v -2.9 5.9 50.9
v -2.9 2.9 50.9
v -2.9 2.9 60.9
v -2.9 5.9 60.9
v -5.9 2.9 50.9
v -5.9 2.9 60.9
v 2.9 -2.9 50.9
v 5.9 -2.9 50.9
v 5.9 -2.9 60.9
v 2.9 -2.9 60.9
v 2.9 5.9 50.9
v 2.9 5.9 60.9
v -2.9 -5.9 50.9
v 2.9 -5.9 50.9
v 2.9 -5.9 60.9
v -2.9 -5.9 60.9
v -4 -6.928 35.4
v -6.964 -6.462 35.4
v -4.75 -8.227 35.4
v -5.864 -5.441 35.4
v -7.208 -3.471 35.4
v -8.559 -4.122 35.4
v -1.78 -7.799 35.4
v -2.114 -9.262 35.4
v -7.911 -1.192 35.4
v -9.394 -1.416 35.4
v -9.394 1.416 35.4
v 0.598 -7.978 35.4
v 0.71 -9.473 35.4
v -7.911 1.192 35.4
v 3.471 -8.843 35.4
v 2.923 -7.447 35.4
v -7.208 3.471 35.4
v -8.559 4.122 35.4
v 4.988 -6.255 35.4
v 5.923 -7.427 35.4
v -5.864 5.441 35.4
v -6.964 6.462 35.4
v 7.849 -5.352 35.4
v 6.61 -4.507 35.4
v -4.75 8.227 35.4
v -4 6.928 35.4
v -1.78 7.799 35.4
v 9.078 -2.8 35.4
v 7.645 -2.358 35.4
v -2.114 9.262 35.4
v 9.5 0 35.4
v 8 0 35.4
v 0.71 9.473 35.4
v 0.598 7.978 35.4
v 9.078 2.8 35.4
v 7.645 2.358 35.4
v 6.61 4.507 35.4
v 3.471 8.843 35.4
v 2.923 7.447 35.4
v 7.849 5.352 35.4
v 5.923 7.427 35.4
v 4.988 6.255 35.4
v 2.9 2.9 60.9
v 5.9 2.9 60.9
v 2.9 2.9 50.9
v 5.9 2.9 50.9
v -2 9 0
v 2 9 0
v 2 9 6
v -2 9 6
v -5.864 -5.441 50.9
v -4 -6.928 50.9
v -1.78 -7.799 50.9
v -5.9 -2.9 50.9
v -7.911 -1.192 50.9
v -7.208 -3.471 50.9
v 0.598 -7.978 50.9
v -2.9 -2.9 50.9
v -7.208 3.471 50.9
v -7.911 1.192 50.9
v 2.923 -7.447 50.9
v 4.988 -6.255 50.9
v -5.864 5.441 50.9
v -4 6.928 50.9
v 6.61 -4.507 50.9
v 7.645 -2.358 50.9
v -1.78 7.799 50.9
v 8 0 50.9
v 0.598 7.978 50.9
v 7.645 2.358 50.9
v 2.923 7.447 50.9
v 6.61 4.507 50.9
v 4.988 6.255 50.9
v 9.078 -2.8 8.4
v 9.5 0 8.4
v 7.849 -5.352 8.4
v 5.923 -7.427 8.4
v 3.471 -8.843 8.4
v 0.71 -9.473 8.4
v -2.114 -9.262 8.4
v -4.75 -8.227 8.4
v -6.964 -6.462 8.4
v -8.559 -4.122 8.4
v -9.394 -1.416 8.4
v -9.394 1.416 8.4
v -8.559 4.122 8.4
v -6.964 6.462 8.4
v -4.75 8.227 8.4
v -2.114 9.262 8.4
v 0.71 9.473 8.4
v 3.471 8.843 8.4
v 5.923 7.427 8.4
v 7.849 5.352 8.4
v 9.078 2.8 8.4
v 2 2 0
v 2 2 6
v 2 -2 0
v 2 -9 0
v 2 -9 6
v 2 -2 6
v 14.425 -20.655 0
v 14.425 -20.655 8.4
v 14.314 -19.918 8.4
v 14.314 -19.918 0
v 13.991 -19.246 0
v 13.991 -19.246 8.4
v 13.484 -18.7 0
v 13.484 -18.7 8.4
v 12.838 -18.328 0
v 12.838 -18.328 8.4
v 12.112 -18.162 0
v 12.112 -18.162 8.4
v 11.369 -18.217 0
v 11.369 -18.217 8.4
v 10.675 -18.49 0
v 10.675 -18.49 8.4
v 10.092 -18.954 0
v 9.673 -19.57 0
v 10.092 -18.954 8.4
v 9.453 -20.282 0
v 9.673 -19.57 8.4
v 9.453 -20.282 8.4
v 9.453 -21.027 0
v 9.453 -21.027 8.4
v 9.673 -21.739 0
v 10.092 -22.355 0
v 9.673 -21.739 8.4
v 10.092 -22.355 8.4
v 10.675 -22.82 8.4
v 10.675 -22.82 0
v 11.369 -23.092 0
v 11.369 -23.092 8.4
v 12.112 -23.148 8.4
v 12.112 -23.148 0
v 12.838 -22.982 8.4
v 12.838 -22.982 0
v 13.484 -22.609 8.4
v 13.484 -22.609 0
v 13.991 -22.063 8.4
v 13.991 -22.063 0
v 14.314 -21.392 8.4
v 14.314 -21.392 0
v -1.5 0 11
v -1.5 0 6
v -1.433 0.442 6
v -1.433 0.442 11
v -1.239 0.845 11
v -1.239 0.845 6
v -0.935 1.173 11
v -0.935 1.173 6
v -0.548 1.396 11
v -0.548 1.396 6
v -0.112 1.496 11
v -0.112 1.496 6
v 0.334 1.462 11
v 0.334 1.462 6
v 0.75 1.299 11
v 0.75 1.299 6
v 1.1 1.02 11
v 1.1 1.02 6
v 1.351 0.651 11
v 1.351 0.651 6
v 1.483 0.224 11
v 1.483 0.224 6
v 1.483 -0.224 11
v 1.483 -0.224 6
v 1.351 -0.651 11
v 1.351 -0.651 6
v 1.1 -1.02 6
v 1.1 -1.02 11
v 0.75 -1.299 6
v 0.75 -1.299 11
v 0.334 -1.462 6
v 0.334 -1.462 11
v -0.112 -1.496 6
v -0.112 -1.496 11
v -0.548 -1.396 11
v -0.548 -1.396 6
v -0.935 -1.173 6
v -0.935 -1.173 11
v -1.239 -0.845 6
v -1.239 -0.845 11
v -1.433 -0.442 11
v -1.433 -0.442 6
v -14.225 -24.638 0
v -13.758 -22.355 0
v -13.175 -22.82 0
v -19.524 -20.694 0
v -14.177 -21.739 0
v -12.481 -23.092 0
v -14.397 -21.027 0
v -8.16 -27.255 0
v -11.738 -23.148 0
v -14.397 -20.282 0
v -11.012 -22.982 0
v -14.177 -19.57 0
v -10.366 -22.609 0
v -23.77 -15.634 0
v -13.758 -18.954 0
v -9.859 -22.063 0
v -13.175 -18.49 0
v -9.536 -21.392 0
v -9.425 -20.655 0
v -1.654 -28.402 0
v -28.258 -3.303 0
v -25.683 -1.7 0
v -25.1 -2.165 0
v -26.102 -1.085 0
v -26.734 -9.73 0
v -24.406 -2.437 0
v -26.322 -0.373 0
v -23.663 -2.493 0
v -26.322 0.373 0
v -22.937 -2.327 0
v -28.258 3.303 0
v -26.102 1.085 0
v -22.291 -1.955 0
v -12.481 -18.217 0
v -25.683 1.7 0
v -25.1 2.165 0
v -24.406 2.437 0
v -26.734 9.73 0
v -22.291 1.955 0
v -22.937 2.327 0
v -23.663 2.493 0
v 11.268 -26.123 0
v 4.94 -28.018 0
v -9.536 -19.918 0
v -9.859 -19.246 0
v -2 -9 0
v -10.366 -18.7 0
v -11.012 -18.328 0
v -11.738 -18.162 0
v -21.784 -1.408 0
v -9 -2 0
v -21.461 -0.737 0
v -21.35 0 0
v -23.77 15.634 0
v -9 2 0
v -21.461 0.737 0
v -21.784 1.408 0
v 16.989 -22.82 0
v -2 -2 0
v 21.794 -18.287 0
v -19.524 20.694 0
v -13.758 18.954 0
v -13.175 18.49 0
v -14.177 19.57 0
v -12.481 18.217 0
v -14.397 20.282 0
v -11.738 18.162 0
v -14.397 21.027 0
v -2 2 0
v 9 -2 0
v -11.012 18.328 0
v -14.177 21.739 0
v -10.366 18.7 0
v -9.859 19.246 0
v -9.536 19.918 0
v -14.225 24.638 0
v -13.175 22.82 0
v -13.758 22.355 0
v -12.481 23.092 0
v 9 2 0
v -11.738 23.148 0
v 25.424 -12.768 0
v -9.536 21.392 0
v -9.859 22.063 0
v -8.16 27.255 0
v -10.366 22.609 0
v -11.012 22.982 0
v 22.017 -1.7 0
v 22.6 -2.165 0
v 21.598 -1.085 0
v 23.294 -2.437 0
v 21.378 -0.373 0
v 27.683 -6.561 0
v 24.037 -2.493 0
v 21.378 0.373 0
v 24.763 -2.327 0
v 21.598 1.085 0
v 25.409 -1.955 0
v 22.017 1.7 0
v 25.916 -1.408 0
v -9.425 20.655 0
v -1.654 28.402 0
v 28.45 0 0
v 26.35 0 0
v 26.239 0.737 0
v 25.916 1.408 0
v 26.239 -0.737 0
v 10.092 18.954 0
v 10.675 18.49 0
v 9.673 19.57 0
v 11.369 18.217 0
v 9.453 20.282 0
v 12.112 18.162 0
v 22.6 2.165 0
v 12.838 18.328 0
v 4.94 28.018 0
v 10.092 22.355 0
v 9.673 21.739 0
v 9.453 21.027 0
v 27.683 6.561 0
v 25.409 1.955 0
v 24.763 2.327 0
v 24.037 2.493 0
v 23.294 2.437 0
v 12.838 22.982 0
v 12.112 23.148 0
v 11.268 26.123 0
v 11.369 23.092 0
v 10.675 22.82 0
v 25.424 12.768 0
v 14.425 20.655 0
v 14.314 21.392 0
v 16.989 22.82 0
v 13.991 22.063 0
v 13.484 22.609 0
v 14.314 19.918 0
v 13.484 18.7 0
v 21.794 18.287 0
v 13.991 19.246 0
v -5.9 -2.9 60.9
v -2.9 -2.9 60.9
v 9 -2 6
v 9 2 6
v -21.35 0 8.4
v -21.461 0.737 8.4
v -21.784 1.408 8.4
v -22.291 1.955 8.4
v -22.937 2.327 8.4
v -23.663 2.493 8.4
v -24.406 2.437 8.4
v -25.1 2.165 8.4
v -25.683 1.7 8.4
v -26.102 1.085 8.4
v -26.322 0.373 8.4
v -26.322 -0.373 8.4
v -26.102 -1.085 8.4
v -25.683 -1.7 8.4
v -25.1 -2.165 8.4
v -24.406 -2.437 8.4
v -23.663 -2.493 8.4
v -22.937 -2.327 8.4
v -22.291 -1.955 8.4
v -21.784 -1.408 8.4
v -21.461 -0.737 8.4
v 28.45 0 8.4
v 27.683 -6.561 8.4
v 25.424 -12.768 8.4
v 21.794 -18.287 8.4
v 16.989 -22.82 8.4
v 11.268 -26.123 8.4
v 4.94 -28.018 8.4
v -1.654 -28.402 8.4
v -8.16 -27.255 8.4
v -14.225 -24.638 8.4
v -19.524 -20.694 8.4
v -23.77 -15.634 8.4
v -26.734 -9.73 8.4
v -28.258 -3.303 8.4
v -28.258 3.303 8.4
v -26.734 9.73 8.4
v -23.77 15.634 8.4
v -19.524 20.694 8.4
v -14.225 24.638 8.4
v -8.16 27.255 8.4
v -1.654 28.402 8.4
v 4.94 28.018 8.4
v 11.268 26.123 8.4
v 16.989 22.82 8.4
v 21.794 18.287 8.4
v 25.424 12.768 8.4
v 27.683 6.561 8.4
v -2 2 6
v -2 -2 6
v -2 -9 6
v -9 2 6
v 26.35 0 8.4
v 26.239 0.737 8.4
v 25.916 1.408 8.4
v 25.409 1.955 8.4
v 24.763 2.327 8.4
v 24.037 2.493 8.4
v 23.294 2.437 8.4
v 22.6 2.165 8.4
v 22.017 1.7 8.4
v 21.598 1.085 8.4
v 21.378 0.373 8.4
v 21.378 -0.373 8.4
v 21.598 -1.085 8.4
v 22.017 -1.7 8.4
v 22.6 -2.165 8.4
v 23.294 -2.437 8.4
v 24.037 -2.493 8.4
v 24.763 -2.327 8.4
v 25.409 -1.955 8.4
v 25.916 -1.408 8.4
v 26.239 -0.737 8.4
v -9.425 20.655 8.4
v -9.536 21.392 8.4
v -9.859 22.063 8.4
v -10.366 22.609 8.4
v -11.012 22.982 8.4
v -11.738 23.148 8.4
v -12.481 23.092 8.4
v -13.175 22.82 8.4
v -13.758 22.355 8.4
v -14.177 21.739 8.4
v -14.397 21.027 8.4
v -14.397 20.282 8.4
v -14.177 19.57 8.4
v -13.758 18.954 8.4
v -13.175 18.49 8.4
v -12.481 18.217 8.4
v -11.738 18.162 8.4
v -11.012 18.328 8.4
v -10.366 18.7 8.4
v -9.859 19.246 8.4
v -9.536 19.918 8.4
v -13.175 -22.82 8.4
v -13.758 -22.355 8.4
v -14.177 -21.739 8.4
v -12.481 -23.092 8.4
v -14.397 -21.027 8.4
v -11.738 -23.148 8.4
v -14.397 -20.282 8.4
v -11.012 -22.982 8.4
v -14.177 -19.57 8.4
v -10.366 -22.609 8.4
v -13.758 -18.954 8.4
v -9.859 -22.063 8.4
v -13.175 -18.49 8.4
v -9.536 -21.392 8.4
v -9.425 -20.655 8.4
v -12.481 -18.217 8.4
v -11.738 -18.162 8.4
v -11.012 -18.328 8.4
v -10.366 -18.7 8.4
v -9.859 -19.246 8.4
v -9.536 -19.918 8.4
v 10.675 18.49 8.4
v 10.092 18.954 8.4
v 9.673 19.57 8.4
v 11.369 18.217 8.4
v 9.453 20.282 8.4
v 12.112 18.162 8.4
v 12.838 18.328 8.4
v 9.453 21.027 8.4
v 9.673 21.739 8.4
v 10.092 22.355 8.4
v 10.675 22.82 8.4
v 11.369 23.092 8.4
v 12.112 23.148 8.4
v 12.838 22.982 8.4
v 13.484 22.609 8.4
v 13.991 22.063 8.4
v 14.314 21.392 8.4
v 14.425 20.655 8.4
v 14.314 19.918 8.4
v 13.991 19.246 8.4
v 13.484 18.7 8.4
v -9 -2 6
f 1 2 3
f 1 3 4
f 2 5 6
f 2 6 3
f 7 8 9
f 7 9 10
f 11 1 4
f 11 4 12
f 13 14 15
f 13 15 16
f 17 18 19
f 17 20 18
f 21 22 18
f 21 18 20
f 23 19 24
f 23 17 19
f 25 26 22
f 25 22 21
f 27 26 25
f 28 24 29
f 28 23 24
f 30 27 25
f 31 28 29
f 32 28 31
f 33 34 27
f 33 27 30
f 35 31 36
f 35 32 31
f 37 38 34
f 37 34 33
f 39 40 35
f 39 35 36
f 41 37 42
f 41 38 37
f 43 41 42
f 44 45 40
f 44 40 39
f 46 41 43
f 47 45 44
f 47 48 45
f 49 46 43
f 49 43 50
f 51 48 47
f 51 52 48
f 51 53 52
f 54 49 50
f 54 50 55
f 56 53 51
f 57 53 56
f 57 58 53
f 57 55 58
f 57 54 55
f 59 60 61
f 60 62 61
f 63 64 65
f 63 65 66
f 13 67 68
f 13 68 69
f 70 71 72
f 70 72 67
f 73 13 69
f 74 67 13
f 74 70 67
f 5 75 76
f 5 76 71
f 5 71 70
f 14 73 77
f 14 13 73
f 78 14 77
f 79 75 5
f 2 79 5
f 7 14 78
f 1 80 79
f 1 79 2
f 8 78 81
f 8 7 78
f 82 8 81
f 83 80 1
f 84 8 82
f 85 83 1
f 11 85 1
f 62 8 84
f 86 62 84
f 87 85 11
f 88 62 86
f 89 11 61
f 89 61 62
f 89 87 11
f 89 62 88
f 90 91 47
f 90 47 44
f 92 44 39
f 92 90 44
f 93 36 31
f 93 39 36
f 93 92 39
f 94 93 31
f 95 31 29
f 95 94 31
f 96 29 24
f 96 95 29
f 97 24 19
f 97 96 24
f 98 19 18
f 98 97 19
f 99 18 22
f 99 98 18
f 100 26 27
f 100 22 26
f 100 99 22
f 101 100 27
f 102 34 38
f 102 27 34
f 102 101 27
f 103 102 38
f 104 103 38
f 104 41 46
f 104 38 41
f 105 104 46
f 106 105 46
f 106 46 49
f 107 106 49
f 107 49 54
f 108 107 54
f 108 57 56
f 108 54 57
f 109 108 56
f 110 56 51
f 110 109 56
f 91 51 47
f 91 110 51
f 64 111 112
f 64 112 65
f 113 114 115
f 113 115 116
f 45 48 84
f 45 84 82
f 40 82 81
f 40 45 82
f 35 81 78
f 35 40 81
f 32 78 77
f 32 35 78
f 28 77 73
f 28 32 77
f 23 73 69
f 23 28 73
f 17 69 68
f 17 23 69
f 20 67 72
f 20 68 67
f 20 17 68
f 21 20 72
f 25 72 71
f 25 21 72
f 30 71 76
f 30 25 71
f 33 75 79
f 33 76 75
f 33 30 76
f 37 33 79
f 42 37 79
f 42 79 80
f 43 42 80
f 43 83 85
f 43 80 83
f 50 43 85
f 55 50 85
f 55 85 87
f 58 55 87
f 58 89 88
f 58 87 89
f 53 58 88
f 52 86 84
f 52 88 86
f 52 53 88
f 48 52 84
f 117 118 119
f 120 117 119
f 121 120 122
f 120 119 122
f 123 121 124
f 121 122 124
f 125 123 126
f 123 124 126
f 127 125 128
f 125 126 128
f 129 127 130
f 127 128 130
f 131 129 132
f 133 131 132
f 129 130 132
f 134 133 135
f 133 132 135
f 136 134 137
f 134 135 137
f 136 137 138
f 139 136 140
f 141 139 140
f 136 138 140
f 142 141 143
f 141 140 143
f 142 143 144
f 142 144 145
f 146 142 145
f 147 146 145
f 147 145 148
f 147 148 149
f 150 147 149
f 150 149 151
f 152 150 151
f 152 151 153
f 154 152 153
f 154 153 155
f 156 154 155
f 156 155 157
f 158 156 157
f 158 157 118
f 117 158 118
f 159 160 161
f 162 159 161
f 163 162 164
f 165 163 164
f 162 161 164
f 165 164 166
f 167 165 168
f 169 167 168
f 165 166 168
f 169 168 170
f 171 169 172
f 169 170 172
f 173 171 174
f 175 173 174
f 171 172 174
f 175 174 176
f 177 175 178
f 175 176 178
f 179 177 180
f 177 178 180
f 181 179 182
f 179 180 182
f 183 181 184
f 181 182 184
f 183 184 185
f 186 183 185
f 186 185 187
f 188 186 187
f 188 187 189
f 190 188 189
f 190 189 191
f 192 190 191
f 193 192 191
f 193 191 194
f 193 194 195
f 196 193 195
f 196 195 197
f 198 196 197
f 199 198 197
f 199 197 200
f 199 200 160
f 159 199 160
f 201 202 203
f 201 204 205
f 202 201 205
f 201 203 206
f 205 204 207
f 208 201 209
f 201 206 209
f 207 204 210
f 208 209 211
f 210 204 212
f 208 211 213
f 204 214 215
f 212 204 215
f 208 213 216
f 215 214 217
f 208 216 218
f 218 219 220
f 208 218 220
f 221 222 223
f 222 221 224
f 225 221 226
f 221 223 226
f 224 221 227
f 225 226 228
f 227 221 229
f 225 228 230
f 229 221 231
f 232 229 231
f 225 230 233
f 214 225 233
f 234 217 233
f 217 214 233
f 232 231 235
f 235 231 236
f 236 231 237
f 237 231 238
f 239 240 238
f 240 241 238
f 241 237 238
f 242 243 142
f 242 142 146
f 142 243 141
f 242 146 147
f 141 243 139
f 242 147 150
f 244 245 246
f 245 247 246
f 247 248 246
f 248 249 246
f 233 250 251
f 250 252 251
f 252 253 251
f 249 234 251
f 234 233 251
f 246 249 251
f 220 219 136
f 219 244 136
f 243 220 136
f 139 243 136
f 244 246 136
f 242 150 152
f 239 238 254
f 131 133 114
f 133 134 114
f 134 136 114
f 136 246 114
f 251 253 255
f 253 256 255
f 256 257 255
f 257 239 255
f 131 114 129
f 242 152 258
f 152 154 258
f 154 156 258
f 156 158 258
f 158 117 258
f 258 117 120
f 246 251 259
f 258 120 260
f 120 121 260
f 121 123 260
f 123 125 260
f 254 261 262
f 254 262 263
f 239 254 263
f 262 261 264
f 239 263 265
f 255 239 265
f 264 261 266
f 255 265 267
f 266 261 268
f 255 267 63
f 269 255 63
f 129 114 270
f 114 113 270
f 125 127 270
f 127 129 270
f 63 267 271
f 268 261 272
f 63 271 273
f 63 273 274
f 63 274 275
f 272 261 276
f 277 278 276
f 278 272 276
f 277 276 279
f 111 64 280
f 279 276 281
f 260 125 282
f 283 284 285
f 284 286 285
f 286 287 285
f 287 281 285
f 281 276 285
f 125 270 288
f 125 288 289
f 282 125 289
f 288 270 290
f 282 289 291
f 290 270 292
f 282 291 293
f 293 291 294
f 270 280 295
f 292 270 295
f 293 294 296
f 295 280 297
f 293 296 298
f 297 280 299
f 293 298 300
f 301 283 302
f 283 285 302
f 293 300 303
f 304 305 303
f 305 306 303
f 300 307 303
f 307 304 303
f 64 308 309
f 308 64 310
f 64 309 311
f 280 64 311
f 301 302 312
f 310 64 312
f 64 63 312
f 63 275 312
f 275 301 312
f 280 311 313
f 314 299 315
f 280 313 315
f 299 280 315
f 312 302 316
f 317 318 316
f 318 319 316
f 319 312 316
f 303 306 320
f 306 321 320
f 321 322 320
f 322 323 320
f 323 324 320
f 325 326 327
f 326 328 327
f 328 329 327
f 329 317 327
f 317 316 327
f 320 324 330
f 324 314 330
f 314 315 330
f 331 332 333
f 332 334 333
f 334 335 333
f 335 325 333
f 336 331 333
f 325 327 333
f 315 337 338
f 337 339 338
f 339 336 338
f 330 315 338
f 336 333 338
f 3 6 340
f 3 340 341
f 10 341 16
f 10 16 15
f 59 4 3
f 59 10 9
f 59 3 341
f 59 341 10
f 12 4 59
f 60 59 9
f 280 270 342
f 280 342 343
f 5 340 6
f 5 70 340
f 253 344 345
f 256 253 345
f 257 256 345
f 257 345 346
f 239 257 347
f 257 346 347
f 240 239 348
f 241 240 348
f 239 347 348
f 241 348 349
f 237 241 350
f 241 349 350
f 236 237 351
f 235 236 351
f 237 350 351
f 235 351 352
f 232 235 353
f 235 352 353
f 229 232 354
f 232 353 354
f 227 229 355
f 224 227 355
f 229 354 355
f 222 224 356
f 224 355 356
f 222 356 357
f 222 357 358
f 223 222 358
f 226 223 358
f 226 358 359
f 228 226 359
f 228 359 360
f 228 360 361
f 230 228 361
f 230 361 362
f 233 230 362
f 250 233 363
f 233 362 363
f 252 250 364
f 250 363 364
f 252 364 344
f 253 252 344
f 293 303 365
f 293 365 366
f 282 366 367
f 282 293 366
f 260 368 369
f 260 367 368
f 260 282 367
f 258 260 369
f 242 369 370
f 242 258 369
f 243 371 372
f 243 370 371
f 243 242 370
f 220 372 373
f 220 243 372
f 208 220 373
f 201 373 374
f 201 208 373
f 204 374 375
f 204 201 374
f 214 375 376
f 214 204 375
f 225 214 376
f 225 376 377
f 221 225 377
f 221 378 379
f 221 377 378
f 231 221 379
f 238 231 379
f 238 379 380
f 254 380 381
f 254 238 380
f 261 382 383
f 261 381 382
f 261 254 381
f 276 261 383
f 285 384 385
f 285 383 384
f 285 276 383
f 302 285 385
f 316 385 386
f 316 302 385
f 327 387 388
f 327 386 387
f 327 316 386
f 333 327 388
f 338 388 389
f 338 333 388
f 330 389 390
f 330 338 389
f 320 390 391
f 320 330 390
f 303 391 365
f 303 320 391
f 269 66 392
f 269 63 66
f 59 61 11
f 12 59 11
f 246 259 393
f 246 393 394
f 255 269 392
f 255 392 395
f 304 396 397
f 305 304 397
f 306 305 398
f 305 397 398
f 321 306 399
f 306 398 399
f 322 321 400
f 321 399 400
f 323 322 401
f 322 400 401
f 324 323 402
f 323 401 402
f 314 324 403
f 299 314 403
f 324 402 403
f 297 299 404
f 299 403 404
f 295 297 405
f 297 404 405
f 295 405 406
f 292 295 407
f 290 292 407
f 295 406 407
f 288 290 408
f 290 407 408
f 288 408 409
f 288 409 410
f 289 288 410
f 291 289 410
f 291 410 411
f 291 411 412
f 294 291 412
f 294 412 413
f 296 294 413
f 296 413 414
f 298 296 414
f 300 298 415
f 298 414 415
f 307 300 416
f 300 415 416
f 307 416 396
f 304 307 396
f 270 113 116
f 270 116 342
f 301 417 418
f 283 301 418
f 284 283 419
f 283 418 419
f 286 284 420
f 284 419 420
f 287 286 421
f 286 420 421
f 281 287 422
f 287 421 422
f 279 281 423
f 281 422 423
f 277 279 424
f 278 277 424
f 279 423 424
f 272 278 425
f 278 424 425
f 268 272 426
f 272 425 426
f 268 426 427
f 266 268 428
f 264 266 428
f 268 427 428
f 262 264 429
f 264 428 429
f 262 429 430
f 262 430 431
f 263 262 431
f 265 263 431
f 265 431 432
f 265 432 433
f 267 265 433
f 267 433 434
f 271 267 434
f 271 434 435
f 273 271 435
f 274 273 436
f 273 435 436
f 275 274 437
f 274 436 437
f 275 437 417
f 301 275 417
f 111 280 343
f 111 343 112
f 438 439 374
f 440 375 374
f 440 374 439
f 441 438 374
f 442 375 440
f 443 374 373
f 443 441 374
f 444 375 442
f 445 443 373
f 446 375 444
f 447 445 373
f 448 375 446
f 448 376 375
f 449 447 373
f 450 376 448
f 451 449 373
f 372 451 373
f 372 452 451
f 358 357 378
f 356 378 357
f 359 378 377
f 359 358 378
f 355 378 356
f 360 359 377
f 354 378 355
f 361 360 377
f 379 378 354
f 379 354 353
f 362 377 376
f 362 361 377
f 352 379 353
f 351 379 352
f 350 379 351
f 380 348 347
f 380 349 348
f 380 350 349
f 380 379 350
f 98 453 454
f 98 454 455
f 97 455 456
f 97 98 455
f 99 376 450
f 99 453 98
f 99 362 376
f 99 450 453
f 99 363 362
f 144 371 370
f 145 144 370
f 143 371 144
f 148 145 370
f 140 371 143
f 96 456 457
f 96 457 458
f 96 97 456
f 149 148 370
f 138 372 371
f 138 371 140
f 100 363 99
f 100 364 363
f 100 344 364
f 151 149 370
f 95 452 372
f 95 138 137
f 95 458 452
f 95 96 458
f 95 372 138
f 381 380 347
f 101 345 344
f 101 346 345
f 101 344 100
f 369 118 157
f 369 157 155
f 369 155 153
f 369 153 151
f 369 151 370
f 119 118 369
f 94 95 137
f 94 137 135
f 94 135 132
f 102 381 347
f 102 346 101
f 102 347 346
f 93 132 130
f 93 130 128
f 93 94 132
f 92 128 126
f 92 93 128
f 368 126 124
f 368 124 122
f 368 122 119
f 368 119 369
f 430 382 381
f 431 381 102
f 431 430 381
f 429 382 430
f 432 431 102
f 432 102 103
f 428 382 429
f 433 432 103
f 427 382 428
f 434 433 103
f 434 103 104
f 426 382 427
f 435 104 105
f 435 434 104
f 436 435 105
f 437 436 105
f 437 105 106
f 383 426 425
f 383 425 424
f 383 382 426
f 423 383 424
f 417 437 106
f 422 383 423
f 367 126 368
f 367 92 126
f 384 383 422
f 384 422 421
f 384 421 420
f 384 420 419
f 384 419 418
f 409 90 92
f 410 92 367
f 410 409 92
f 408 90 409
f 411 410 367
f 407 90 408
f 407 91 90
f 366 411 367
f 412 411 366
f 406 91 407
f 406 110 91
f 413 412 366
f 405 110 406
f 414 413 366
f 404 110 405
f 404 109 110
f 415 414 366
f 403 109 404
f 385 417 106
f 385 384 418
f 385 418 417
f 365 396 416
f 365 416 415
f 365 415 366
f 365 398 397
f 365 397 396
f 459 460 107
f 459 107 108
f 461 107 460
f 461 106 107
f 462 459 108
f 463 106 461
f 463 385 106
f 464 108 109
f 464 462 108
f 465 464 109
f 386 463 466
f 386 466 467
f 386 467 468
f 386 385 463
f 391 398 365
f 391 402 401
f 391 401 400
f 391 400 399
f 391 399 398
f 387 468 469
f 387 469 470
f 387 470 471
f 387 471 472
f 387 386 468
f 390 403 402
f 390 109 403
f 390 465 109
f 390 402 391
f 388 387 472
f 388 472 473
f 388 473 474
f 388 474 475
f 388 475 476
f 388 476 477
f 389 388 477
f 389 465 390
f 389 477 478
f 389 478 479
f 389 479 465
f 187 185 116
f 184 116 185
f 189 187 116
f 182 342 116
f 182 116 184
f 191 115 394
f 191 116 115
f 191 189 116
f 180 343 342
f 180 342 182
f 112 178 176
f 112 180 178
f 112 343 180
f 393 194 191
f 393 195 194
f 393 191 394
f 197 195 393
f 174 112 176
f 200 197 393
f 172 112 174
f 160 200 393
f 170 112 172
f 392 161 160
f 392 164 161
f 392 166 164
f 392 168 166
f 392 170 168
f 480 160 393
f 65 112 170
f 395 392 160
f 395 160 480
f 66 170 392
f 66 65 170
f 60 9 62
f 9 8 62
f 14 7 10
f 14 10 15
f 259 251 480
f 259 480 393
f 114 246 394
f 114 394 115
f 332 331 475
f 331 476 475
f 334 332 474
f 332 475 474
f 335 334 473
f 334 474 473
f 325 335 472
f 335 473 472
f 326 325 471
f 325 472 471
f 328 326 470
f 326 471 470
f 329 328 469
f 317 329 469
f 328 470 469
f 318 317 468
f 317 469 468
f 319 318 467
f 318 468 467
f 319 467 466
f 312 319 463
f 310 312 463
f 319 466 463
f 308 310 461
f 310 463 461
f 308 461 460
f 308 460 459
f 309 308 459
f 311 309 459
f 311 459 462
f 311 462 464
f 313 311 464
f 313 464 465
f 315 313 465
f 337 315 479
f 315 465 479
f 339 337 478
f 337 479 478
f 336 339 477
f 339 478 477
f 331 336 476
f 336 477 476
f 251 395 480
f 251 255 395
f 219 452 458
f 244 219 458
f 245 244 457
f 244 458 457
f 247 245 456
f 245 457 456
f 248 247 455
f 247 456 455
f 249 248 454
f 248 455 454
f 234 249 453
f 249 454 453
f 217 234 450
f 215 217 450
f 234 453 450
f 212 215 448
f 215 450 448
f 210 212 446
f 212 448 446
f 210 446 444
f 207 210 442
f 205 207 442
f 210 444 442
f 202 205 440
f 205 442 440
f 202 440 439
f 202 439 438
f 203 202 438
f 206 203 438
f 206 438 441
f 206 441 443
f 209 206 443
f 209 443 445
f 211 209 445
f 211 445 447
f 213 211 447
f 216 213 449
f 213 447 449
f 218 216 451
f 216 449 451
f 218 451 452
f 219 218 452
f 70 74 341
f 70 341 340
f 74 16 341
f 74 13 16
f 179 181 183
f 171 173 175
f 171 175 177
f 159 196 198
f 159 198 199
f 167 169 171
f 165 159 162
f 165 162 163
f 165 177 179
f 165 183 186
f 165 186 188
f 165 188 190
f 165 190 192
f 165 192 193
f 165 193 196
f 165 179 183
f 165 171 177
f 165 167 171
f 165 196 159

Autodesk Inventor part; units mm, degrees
ref_plane "YZ Plane" through (0, 0, 0) normal (1, 0, 0) x (0, 1, 0)
ref_plane "XZ Plane" through (0, 0, 0) normal (0, 1, 0) x (-1, 0, 0)
ref_plane "XY Plane" through (0, 0, 0) normal (0, 0, 1) x (1, 0, 0)
sketch "Sketch1" plane through (0, 0, 0) normal (0, 0, 1) x (1, 0, 0)
  circle A0 centre (0, 0) radius 28.45
  dimension "d0" = 56.9
extrude "Extrusion1" add sketch "Sketch1" along normal blind 8.4
sketch "Sketch2" plane through (0, 0, 8.4) normal (0, 0, 1) x (1, 0, 0)
  line L0 (0, 0) -> (23.85, 0)
  line L1 (0, 0) -> (11.925, 20.6547)
  line L2 (0, 0) -> (23.85, 0) construction
  line L3 (0, 0) -> (-11.925, 20.6547)
  line L4 (0, 0) -> (23.85, 0) construction
  line L5 (0, 0) -> (-23.85, 0)
  line L6 (0, 0) -> (23.85, 0) construction
  line L7 (0, 0) -> (11.925, -20.6547)
  line L8 (0, 0) -> (23.85, 0) construction
  line L9 (0, 0) -> (-11.925, -20.6547)
  line L10 (0, 0) -> (23.85, 0) construction
  circle A0 centre (23.85, 0) radius 2.5
  circle A1 centre (11.925, 20.6547) radius 2.5
  circle A2 centre (11.925, -20.6547) radius 2.5
  circle A3 centre (-11.925, -20.6547) radius 2.5
  circle A4 centre (-23.85, 0) radius 2.5
  circle A5 centre (-11.925, 20.6547) radius 2.5
  dimension "d3" = 23.85
  dimension "d4" = 23.85
  dimension "d5" = 60
  dimension "d6" = 23.85
  dimension "d7" = 120
  dimension "d8" = 23.85
  dimension "d9" = 180
  dimension "d10" = 23.85
  dimension "d11" = 60
  dimension "d12" = 23.85
  dimension "d13" = 120
  dimension "d14" = 5
  dimension "d15" = 5
  dimension "d16" = 5
  dimension "d17" = 5
  dimension "d18" = 5
  dimension "d19" = 5
extrude "Extrusion2" cut sketch "Sketch2" against normal blind 8.4
sketch "Sketch3" plane through (0, 0, 8.4) normal (0, 0, 1) x (1, 0, 0)
  circle A0 centre (0, 0) radius 9.5
  dimension "d22" = 19
extrude "Extrusion3" add sketch "Sketch3" along normal blind 27
sketch "Sketch4" plane through (0, 0, 35.4) normal (0, 0, 1) x (1, 0, 0)
  circle A0 centre (0, 0) radius 8
  dimension "d25" = 16
extrude "Extrusion4" add sketch "Sketch4" along normal blind 15.5
sketch "Sketch6" plane through (0, 0, 0) normal (0, 0, -1) x (-1, 0, 0)
  line L0 (0, 0) -> (0, 9)
  line L1 (0, 9) -> (2, 9)
  line L2 (2, 9) -> (2, 2)
  line L3 (2, 2) -> (9, 2)
  line L4 (9, 2) -> (9, -2)
  line L5 (9, -2) -> (2, -2)
  line L6 (2, -2) -> (2, -9)
  line L7 (2, -9) -> (-2, -9)
  line L8 (-2, -9) -> (-2, -2)
  line L9 (-2, -2) -> (-9, -2)
  line L10 (-9, -2) -> (-9, 2)
  line L11 (-9, 2) -> (-2, 2)
  line L12 (-2, 2) -> (-2, 9)
  line L13 (-2, 9) -> (0, 9)
  dimension "d120" = 9
  dimension "d121" = 2
  dimension "d122" = 7
  dimension "d124" = 7
  dimension "d125" = 4
  dimension "d126" = 7
  dimension "d127" = 7
  dimension "d128" = 4
  dimension "d129" = 7
  dimension "d130" = 7
  dimension "d131" = 4
  dimension "d132" = 7
  dimension "d133" = 7
extrude "Extrusion6" cut sketch "Sketch6" against normal blind 6
sketch "Sketch7" plane through (0, 0, 6) normal (0, 0, -1) x (-1, 0, 0)
  circle A0 centre (0, 0) radius 1.5
  dimension "d91" = 3
extrude "Extrusion7" cut sketch "Sketch7" against normal blind 5
thread "Thread3" size "M3x0.5" class "6H" standard "ANSI Metric M Profile" full length
sketch "Sketch12" plane through (0, 0, 50.9) normal (0, 0, 1) x (1, 0, 0)
  line L0 (0, 0) -> (5.9, 0)
  line L1 (5.9, 0) -> (5.9, 2.9)
  line L2 (5.9, 0) -> (5.9, -2.9)
  line L3 (5.9, 2.9) -> (2.9, 2.9)
  line L4 (2.9, 2.9) -> (2.9, 5.9)
  line L5 (5.9, -2.9) -> (2.9, -2.9)
  line L6 (2.9, -2.9) -> (2.9, -5.9)
  line L7 (2.9, -5.9) -> (-2.9, -5.9)
  line L8 (-2.9, -5.9) -> (-2.9, -2.9)
  line L9 (-2.9, -2.9) -> (-5.9, -2.9)
  line L10 (-5.9, -2.9) -> (-5.9, 2.9)
  line L11 (-5.9, 2.9) -> (-2.9, 2.9)
  line L12 (-2.9, 2.9) -> (-2.9, 5.9)
  line L13 (-2.9, 5.9) -> (2.9, 5.9)
  dimension "d221" = 5.9
  dimension "d222" = 2.9
  dimension "d223" = 2.9
  dimension "d224" = 3
  dimension "d225" = 3
  dimension "d226" = 3
  dimension "d227" = 3
  dimension "d228" = 5.8
  dimension "d229" = 3
  dimension "d230" = 3
  dimension "d231" = 5.8
  dimension "d232" = 3
  dimension "d233" = 3
extrude "Extrusion11" add sketch "Sketch12" along normal blind 10
properties part number "OmniWheelAxle"
